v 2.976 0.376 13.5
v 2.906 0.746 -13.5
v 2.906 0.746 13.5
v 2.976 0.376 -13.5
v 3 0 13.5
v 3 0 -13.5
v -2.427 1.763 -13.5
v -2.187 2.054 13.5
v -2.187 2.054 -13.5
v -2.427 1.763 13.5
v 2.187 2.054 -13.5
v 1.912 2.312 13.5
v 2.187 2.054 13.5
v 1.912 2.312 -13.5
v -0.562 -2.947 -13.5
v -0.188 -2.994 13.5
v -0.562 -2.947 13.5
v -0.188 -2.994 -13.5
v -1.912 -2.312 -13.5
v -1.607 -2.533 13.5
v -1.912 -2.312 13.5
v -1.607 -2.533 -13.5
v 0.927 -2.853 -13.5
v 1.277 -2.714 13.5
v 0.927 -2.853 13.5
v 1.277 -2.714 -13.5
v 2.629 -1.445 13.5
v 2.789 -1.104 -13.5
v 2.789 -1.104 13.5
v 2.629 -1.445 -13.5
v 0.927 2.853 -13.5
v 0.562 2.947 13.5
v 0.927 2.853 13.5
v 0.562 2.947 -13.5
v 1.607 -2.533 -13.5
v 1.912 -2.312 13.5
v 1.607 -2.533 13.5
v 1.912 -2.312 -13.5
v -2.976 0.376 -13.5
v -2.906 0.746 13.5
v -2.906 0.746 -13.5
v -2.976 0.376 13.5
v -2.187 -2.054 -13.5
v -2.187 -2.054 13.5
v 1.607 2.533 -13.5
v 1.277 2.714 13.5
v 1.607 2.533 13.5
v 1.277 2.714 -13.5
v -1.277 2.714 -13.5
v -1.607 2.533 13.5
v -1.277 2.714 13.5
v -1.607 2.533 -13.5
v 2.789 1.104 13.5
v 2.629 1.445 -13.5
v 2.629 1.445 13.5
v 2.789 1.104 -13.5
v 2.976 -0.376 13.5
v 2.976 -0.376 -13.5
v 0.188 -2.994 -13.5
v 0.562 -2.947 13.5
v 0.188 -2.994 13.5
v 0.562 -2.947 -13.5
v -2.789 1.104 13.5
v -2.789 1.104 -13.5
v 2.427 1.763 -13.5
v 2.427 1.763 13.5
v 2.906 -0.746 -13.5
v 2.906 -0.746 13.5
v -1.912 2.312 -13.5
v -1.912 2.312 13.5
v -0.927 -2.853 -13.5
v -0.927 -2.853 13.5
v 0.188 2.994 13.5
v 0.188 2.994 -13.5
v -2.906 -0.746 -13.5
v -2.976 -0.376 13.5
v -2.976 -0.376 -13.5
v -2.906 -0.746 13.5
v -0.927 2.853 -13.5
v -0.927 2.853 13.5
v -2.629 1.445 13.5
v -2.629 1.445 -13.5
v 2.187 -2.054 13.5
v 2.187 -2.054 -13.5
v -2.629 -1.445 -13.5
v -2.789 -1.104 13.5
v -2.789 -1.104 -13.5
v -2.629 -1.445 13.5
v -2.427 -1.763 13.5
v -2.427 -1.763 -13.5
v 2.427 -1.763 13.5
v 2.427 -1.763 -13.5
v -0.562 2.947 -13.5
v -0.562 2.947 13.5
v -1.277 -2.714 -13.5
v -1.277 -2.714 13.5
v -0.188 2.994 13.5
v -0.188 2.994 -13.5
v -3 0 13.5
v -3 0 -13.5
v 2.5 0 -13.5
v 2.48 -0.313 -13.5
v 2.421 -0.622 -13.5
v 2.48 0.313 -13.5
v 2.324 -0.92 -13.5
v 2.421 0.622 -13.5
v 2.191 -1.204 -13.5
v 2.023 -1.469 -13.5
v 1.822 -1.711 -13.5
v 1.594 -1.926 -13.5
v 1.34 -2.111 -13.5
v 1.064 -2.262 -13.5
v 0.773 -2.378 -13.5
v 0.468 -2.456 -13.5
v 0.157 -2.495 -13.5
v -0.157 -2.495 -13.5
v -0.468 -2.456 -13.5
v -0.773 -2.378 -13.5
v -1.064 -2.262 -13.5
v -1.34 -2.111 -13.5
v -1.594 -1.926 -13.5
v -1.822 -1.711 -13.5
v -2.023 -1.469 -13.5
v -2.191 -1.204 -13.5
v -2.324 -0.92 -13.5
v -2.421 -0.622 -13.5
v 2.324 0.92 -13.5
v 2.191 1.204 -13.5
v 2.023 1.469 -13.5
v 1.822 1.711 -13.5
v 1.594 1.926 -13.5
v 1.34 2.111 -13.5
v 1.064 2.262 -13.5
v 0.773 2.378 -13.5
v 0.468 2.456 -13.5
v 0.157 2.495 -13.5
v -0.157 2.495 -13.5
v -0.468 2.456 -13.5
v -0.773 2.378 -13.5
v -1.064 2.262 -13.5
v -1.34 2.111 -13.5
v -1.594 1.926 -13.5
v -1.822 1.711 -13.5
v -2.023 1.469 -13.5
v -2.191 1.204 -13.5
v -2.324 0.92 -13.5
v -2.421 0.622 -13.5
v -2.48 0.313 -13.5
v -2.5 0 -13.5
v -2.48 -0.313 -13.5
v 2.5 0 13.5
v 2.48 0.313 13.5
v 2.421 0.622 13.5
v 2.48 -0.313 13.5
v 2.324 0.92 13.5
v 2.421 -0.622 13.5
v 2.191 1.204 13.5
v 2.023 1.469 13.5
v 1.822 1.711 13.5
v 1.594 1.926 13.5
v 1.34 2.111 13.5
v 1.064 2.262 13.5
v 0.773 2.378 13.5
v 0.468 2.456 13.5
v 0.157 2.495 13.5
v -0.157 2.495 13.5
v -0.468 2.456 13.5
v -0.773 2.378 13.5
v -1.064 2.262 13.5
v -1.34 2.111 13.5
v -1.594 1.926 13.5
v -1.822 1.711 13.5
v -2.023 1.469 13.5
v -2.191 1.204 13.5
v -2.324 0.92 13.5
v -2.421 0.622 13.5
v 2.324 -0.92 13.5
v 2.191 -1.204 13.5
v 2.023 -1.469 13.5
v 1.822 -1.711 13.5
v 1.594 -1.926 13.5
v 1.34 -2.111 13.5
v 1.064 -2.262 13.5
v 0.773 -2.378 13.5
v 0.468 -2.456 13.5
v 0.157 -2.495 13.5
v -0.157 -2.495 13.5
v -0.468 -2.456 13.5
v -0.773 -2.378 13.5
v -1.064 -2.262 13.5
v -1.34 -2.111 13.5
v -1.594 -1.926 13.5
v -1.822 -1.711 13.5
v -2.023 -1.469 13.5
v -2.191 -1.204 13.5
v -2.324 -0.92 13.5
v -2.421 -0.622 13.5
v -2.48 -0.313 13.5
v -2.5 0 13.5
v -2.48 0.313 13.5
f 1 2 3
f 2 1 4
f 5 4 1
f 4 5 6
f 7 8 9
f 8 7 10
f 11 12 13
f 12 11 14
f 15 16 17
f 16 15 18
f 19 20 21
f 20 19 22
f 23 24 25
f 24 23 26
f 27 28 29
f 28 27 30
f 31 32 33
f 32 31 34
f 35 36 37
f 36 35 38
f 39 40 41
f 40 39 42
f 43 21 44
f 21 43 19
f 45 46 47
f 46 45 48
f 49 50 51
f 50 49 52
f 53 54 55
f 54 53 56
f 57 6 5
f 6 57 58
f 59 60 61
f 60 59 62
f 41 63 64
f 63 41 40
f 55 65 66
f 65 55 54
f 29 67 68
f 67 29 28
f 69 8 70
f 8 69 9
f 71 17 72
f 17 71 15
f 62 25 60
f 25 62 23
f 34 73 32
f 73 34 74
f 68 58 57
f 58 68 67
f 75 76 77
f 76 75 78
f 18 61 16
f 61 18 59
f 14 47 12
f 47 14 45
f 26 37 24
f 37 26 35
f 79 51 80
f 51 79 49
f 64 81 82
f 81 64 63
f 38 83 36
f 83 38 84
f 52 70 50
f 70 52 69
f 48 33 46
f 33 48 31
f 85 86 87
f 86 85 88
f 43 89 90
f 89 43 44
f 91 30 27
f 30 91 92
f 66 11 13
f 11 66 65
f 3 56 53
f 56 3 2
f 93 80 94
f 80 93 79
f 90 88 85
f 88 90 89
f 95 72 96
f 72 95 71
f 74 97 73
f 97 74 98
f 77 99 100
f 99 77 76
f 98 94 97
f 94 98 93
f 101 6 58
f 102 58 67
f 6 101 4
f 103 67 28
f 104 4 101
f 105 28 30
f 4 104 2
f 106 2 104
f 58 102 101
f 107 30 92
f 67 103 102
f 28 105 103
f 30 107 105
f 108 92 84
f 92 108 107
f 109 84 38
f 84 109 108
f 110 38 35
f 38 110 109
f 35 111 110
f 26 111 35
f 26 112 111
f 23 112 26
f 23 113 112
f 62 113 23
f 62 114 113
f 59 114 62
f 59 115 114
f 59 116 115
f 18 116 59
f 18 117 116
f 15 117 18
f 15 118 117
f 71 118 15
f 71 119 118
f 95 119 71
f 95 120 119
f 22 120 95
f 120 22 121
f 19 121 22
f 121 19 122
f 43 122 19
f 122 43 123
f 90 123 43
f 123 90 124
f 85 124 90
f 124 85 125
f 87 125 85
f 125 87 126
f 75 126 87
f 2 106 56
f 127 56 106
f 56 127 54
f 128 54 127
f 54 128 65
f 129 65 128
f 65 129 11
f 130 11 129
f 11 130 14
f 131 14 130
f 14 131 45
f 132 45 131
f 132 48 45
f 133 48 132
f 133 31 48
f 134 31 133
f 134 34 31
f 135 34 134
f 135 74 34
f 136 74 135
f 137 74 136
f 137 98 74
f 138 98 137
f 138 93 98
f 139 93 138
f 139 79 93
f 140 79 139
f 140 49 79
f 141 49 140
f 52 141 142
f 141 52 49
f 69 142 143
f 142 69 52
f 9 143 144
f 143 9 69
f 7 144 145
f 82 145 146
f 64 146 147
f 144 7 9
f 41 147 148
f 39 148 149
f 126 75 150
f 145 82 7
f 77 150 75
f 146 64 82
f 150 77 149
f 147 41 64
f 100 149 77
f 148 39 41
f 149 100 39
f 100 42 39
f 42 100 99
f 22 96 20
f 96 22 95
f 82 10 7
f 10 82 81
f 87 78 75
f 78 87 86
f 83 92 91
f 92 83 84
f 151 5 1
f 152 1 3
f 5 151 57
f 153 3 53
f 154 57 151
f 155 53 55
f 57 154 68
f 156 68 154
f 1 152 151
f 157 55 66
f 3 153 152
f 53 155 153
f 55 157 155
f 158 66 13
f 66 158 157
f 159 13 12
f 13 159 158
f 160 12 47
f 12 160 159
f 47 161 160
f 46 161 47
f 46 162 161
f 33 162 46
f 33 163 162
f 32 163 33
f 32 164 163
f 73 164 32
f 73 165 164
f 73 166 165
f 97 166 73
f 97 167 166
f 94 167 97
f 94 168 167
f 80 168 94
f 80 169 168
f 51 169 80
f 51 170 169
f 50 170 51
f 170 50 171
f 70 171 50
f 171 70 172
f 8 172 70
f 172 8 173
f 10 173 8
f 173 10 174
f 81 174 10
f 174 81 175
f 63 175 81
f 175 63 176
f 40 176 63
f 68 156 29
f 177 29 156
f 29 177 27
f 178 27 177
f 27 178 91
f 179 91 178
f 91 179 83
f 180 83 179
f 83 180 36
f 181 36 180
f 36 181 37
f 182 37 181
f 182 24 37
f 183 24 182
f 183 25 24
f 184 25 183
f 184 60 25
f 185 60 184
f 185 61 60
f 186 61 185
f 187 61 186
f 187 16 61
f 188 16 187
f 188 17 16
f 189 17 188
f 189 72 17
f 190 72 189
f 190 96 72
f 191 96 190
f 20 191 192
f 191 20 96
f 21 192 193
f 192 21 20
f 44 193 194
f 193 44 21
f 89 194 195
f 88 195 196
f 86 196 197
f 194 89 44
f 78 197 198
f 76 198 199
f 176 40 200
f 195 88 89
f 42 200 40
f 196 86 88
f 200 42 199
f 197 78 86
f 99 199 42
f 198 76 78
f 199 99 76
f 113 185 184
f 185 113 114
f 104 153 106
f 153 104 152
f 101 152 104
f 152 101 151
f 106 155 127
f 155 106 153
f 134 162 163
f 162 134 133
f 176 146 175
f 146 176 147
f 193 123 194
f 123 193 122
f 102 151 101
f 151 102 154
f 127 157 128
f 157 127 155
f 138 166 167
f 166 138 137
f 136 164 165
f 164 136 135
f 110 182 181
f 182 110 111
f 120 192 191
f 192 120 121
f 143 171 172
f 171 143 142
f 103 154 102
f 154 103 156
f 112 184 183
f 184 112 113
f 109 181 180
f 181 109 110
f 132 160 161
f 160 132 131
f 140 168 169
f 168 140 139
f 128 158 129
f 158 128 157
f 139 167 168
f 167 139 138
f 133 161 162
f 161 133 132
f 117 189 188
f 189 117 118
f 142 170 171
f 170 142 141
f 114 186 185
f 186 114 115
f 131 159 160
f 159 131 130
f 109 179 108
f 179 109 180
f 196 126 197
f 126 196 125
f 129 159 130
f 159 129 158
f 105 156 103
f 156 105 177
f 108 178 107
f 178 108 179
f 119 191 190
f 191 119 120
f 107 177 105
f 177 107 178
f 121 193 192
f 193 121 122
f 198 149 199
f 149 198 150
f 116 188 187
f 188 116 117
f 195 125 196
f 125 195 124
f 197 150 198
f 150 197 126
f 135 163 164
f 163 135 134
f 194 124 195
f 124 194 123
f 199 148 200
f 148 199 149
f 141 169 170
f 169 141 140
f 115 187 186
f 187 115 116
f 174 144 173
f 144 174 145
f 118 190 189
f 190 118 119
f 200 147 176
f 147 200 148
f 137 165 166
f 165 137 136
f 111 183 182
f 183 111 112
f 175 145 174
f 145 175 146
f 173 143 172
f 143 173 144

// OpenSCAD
$fn = 50;


difference() {
	union() {
		translate(v = [0, 0, -13.5000000000]) {
			cylinder(h = 27, r = 3.0000000000);
		}
	}
	union() {
		translate(v = [0, 0, -100.0000000000]) {
			cylinder(h = 200, r = 2.5000000000);
		}
	}
}
